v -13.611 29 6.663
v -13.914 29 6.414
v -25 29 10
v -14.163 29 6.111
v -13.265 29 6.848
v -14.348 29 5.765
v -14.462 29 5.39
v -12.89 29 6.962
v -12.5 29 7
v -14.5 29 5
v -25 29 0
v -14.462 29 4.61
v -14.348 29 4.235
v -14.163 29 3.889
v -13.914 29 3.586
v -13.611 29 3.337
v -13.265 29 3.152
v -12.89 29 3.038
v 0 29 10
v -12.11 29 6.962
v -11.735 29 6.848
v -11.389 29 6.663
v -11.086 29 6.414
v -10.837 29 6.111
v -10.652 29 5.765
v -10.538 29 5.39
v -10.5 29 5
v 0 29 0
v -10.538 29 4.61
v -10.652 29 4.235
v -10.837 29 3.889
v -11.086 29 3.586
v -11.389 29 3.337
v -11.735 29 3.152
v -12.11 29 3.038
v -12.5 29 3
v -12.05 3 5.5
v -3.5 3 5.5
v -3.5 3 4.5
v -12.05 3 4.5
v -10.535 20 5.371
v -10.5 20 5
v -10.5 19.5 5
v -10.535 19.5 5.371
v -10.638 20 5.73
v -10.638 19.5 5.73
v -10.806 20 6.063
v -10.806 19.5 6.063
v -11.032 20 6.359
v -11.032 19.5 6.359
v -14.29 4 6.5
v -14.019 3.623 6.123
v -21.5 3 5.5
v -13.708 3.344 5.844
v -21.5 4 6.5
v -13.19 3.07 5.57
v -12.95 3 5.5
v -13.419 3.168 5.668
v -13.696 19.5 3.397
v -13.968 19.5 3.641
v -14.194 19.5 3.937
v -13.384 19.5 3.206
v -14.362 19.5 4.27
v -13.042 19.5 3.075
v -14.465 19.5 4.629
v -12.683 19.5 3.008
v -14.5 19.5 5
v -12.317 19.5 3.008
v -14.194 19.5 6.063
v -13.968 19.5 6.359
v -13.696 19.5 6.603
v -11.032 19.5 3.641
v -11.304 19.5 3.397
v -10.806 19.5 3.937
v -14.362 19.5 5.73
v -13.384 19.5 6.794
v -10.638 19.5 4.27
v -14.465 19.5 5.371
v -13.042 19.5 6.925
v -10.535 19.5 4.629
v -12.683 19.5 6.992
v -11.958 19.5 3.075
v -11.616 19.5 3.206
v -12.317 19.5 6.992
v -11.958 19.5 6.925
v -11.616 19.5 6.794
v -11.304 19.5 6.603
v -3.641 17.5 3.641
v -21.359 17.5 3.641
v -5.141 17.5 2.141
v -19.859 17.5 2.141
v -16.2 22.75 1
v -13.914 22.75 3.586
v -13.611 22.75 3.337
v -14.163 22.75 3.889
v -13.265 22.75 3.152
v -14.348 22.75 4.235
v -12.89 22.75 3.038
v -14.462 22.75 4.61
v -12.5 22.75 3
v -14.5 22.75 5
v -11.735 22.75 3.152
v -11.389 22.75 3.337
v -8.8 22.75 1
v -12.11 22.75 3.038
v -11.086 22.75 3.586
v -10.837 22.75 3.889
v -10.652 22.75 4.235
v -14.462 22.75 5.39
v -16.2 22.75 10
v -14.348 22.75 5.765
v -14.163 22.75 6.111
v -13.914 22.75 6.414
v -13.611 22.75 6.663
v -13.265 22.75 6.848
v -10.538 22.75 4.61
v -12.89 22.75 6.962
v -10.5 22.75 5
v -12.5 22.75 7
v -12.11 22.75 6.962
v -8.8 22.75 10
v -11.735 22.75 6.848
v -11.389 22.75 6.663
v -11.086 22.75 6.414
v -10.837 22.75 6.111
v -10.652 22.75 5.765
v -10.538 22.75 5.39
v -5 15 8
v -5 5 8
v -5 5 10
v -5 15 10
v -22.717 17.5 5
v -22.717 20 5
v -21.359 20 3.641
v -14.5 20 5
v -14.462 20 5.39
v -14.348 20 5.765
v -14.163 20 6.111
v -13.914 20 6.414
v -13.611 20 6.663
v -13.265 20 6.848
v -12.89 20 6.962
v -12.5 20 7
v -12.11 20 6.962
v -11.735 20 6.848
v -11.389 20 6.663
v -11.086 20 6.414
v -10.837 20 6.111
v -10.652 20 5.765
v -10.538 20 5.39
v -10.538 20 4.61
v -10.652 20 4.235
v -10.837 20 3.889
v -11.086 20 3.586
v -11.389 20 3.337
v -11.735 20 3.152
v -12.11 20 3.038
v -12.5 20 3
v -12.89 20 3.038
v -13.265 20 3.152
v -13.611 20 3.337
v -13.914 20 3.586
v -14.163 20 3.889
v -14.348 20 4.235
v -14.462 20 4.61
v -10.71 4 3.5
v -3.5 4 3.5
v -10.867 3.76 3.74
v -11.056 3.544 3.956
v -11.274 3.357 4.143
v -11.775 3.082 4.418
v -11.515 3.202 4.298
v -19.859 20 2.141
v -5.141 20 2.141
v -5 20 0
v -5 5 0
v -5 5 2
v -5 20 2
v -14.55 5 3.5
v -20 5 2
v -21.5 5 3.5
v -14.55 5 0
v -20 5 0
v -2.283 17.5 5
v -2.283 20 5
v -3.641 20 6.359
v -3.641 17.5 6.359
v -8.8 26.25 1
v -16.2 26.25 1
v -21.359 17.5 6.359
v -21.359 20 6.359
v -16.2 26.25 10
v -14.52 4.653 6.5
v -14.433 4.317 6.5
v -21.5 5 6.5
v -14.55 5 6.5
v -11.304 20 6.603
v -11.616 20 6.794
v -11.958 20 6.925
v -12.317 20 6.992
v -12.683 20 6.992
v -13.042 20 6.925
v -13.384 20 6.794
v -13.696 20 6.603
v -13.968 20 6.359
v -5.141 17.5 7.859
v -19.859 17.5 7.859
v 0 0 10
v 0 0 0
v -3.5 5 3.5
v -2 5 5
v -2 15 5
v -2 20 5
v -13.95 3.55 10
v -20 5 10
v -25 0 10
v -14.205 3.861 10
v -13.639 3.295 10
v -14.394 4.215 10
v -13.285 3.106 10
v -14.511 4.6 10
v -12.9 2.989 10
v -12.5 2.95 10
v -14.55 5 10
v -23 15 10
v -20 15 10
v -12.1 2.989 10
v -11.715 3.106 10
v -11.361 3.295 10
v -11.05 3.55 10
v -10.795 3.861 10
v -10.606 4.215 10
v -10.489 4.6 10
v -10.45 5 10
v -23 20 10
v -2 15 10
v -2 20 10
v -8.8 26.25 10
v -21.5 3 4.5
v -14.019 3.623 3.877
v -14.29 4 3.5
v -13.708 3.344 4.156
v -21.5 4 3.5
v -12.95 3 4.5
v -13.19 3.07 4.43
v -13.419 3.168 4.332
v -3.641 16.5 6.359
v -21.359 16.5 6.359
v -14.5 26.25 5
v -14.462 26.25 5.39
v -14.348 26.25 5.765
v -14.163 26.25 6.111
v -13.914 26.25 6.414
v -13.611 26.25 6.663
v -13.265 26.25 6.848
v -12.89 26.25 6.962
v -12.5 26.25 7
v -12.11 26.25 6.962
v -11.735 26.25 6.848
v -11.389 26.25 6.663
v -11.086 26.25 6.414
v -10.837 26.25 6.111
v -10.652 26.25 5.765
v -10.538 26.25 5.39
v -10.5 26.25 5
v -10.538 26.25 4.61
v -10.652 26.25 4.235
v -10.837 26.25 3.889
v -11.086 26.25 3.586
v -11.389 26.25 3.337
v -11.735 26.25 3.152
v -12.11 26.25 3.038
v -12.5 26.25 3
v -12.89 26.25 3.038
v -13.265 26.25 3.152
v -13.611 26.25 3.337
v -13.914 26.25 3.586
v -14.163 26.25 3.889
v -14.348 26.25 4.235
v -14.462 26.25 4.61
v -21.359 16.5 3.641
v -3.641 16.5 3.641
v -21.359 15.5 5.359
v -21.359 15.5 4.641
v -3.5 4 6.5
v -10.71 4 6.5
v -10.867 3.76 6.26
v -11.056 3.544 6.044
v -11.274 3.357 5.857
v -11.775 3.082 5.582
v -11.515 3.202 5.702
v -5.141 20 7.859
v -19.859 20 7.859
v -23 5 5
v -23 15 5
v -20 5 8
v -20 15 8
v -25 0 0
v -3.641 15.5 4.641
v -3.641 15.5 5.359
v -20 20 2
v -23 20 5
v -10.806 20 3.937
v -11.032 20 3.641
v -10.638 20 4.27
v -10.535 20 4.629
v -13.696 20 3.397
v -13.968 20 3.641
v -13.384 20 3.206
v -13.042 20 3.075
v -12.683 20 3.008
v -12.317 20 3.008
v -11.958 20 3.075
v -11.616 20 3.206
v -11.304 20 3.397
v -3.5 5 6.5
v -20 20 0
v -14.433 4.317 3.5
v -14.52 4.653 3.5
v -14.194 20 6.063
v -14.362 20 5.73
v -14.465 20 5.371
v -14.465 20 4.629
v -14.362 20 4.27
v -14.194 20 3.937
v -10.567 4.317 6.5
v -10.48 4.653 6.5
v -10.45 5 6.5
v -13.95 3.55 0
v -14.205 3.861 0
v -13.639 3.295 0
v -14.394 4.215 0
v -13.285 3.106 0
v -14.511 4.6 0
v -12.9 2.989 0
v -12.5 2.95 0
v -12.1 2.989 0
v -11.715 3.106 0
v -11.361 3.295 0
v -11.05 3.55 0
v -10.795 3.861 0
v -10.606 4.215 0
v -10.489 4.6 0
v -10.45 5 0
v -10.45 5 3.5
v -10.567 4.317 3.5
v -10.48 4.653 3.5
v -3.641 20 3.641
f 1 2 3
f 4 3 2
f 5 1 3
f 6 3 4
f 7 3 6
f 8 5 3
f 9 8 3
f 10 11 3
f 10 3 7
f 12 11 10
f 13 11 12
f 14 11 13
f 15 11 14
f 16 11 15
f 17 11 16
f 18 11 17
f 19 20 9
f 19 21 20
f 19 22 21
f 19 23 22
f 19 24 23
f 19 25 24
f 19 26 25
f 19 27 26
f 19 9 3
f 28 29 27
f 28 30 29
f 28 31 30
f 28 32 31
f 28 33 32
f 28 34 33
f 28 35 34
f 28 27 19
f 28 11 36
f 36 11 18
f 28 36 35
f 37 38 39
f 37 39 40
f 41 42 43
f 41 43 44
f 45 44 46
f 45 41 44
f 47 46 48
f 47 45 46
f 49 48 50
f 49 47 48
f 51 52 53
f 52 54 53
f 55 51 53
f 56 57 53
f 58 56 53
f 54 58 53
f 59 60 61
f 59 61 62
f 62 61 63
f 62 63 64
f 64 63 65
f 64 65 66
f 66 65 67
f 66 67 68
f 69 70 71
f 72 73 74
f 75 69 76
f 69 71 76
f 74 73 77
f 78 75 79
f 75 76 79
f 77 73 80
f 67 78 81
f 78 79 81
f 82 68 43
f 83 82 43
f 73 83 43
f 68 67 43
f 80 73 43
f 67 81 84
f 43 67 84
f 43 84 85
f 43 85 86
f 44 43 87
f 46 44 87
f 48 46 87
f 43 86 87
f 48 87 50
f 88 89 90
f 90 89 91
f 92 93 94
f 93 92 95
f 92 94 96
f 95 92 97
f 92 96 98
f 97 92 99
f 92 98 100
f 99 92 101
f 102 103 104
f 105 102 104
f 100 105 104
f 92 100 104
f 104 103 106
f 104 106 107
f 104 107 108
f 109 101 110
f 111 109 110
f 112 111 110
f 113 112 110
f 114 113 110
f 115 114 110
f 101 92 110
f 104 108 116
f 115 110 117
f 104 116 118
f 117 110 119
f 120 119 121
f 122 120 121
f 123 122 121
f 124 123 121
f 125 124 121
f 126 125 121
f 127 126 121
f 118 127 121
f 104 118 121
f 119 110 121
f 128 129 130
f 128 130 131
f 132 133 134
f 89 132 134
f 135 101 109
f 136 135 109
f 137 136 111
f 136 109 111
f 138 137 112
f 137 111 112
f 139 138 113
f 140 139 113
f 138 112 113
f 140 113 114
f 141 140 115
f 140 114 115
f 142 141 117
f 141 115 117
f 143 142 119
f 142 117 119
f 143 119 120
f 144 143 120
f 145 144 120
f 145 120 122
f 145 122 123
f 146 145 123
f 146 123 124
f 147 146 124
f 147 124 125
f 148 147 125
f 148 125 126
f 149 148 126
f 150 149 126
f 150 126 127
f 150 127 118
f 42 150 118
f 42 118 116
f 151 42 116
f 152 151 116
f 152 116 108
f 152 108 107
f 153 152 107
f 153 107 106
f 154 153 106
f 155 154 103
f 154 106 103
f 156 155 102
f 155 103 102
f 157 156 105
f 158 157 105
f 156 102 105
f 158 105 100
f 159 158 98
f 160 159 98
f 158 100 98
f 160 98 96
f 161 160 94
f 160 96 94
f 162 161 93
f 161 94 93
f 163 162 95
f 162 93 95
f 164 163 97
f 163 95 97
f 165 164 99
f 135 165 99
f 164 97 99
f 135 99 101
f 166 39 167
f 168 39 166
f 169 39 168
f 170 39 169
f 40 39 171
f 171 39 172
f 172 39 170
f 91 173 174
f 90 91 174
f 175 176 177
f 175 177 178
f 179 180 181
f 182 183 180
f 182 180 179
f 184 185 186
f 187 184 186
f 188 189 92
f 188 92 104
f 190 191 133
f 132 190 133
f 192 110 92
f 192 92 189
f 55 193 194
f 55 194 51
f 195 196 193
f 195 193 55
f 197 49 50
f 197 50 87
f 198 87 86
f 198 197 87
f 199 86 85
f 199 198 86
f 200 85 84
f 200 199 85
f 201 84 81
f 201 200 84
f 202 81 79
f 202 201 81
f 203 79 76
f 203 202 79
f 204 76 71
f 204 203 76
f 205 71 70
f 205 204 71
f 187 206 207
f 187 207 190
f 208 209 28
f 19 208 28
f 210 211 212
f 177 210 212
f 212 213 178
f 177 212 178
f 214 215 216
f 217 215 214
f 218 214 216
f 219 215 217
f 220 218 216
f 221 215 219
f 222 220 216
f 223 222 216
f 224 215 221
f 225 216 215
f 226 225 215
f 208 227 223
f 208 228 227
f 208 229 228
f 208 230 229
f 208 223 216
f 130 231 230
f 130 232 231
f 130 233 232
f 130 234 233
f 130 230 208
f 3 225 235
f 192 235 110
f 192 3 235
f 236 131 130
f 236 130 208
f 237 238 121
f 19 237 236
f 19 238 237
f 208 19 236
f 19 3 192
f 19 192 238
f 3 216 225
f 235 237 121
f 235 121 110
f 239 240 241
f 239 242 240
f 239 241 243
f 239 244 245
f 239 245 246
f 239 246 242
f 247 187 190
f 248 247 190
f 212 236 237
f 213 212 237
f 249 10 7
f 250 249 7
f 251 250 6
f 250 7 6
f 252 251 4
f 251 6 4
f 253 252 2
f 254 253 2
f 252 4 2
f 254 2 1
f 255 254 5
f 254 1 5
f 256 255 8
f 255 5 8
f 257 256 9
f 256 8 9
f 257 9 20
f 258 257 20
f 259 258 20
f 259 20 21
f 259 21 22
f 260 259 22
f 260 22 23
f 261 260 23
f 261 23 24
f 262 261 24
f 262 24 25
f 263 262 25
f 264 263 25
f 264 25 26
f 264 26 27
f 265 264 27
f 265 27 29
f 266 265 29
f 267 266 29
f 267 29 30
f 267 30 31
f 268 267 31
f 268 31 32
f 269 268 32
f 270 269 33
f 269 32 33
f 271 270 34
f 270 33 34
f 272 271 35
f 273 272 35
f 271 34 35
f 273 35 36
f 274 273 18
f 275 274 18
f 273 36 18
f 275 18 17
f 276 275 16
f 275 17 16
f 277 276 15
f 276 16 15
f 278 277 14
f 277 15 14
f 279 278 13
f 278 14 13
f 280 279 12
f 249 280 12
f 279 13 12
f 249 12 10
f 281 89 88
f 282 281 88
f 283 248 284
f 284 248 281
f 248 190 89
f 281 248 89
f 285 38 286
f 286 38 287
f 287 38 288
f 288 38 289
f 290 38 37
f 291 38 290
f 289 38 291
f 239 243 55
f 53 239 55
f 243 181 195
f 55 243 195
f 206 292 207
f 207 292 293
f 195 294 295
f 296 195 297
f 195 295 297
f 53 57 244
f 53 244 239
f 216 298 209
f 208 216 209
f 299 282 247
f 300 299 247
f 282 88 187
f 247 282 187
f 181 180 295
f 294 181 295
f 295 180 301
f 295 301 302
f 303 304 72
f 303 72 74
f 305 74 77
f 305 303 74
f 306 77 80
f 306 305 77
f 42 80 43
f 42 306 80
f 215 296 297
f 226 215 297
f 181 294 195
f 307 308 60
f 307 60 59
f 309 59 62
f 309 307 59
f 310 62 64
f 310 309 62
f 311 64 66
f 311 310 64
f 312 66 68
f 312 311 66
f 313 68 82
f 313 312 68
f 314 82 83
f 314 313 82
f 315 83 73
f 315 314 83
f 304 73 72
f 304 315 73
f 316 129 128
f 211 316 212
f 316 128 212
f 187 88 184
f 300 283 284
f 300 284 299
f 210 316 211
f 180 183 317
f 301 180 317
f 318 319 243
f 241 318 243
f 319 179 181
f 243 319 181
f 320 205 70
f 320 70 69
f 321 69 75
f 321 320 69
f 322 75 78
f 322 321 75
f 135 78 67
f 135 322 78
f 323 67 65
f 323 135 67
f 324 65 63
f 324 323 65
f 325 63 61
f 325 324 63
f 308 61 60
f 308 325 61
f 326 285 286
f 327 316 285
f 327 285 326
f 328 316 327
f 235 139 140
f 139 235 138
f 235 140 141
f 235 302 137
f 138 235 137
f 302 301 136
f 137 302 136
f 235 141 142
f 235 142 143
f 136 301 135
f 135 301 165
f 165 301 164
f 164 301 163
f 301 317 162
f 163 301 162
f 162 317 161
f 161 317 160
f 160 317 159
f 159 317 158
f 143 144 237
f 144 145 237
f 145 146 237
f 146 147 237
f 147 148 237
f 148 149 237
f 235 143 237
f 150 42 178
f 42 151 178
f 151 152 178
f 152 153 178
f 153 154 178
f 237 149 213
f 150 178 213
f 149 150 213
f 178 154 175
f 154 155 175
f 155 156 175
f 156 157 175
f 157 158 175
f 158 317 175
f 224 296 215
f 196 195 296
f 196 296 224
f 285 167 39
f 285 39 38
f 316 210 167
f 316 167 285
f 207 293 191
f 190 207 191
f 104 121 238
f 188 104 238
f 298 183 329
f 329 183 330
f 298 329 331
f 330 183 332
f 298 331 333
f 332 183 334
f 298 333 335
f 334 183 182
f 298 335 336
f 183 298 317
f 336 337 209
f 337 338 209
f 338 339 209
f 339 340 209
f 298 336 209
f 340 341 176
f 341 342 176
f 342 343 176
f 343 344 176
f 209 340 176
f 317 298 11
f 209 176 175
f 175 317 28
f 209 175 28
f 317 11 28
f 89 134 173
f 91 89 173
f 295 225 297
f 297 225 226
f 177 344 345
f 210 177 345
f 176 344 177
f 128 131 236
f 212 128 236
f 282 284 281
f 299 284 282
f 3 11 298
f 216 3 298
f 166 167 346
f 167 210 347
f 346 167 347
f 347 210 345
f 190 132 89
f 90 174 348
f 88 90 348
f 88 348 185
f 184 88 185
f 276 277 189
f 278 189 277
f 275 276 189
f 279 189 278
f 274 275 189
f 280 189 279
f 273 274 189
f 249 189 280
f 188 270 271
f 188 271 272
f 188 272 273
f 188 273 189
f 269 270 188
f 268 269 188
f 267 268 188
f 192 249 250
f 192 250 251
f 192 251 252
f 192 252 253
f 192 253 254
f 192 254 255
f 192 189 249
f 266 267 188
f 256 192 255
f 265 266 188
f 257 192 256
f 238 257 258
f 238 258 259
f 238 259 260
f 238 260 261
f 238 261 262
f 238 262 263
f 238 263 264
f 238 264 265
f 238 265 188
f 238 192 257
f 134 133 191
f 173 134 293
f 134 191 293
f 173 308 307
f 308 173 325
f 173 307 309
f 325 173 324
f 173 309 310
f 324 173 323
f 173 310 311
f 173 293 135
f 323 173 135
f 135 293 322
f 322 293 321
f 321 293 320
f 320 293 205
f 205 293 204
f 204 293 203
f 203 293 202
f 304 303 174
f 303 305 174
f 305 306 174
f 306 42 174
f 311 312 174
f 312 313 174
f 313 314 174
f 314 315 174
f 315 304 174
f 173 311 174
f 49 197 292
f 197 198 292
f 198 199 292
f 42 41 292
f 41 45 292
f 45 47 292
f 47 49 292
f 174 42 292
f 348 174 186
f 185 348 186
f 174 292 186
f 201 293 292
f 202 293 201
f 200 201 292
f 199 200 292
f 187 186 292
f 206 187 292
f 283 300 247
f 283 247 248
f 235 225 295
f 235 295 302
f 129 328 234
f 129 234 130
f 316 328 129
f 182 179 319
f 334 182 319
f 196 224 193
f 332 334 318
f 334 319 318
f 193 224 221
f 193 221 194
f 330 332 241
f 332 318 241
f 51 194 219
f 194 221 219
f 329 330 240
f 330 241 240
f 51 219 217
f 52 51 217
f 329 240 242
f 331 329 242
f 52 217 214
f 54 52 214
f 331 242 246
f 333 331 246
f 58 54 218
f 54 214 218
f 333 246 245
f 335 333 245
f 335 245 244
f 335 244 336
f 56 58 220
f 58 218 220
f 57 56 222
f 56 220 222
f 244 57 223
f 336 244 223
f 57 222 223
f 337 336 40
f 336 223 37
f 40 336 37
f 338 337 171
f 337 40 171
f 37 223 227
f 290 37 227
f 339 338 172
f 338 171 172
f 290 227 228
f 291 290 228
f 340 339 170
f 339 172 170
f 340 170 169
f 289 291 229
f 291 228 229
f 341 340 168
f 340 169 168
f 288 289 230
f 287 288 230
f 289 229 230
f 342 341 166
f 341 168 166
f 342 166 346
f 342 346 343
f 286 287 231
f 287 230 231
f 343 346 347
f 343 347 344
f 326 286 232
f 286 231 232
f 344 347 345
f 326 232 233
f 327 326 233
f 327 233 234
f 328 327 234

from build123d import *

# Parameters (mm, degrees)
F0_W          = 25
F0_H          = 25
F0_W_2        = 15
F0_H_2        = 15
F0_H_3        = 4
F1_DEPTH      = 10
F2_W          = 3
F2_H          = 5
F3_DEPTH      = 5
F5_DEPTH      = 10
F5_DEPTH_BACK = 5
F6_W          = 18
F6_H          = 3
F7_DEPTH      = 2
F8_SIZE       = 1
F10_DEPTH     = 25
F11_R         = 2
F12_DEPTH     = 9
F13_W         = 7.4
F13_H         = 3.5
F14_DEPTH     = 9
F16_DEPTH     = 2.5
F17_DEPTH     = 4.5
F18_SIZE      = 1
F19_DEPTH     = 0.5


with BuildPart() as f1:
    # F0 (on Top) → F1 (new body)
    with BuildSketch(Plane.XY):
        with Locations((-12.5, 12.5)):
            Rectangle(F0_W, F0_H)
        with Locations((-12.5, 12.5)):
            Rectangle(F0_W_2, F0_H_2, mode=Mode.SUBTRACT)
        with Locations((-12.5, 27)):
            Rectangle(F0_W, F0_H_3)
    extrude(amount=F1_DEPTH)

    # F2 (on face) → F3 (cut)
    with BuildSketch(Plane.XY.offset(10)):
        with Locations((-21.5, 17.5)):
            Rectangle(F2_W, F2_H)
        with Locations((-3.5, 17.5)):
            Rectangle(F2_W, F2_H)
    extrude(amount=-F3_DEPTH, mode=Mode.SUBTRACT)

    # F4 (on face) → F5 (cut, two sides)
    with BuildSketch(Plane(origin=(0, 15, 0), x_dir=(-1, 0, 0), z_dir=(0, 1, 0))) as f5_sk:
        Polygon((20, 2), (23, 5), (20, 5), align=None)
        Polygon((20, 5), (23, 5), (20, 8), align=None)
        Polygon((5, 5), (2, 5), (5, 2), align=None)
        Polygon((5, 8), (2, 5), (5, 5), align=None)
    extrude(amount=-F5_DEPTH, mode=Mode.SUBTRACT)
    extrude(f5_sk.sketch, amount=F5_DEPTH_BACK, mode=Mode.SUBTRACT)

    # F6 (on face) → F7 (cut)
    with BuildSketch(Plane(origin=(0, 5, 0), x_dir=(-1, 0, 0), z_dir=(0, 1, 0))):
        with Locations((12.5, 5)):
            Rectangle(F6_W, F6_H)
    extrude(amount=-F7_DEPTH, mode=Mode.SUBTRACT)

    # F8
    f8_edges = [f1.edges().sort_by_distance(p)[0] for p in [
        (-12.5, 3, 3.5),
        (-12.5, 3, 6.5),
    ]]
    chamfer(f8_edges, length=F8_SIZE)

    # F9 (on face) → F10 (cut)
    with BuildSketch(Plane.XY.offset(10)):
        with BuildLine():
            ThreePointArc((-14.55, 5), (-12.5, 2.95), (-10.45, 5))
            Line((-10.45, 5), (-14.55, 5))
        make_face()
    extrude(amount=-F10_DEPTH, mode=Mode.SUBTRACT)

    # F11 (on face) → F12 (cut, through all)
    with BuildSketch(Plane(origin=(0, 29, 0), x_dir=(-1, 0, 0), z_dir=(0, 1, 0))):
        with Locations((12.5, 5)):
            Circle(F11_R)
    extrude(amount=-F12_DEPTH, mode=Mode.SUBTRACT)

    # F13 (on face) → F14 (cut, through all)
    with BuildSketch(Plane.XY.offset(10)):
        with Locations((-12.5, 24.5)):
            Rectangle(F13_W, F13_H)
    extrude(amount=-F14_DEPTH, mode=Mode.SUBTRACT)


with BuildPart() as f16:
    # F15 (on face) → F16 (new body)
    with BuildSketch(Plane.XZ.offset(-20)):
        with BuildLine():
            Line((-19.8585786438, 7.8585786438), (-21.3585786438, 6.3585786438))
            Line((-21.3585786438, 6.3585786438), (-13.967741145, 6.3585786438))
            ThreePointArc((-13.967741145, 6.3585786438), (-12.5, 7), (-11.032258855, 6.3585786438))
            Line((-11.032258855, 6.3585786438), (-3.6414213562, 6.3585786438))
            Line((-3.6414213562, 6.3585786438), (-5.1414213562, 7.8585786438))
            Line((-5.1414213562, 7.8585786438), (-19.8585786438, 7.8585786438))
        make_face()
        Polygon((-22.7171572875, 5), (-21.3585786438, 3.6414213562), (-21.3585786438, 6.3585786438), align=None)
        with BuildLine():
            Line((-21.3585786438, 6.3585786438), (-21.3585786438, 3.6414213562))
            Line((-21.3585786438, 3.6414213562), (-13.967741145, 3.6414213562))
            ThreePointArc((-13.967741145, 3.6414213562), (-14.5, 5), (-13.967741145, 6.3585786438))
            Line((-13.967741145, 6.3585786438), (-21.3585786438, 6.3585786438))
        make_face()
        with BuildLine():
            Line((-11.032258855, 3.6414213562), (-3.6414213562, 3.6414213562))
            Line((-3.6414213562, 3.6414213562), (-3.6414213562, 6.3585786438))
            Line((-3.6414213562, 6.3585786438), (-11.032258855, 6.3585786438))
            ThreePointArc((-11.032258855, 6.3585786438), (-10.6378128061, 5.7295607274), (-10.5, 5))
            ThreePointArc((-10.5, 5), (-10.6378128061, 4.2704392726), (-11.032258855, 3.6414213562))
        make_face()
        with BuildLine():
            Line((-21.3585786438, 3.6414213562), (-19.8585786438, 2.1414213562))
            Line((-19.8585786438, 2.1414213562), (-5.1414213562, 2.1414213562))
            Line((-5.1414213562, 2.1414213562), (-3.6414213562, 3.6414213562))
            Line((-3.6414213562, 3.6414213562), (-11.032258855, 3.6414213562))
            ThreePointArc((-11.032258855, 3.6414213562), (-12.5, 3), (-13.967741145, 3.6414213562))
            Line((-13.967741145, 3.6414213562), (-21.3585786438, 3.6414213562))
        make_face()
        Polygon((-3.6414213562, 6.3585786438), (-3.6414213562, 3.6414213562), (-2.2828427125, 5), align=None)
        with BuildLine():
            ThreePointArc((-13.967741145, 6.3585786438), (-14.5, 5), (-13.967741145, 3.6414213562))
            Line((-13.967741145, 3.6414213562), (-11.032258855, 3.6414213562))
            ThreePointArc((-11.032258855, 3.6414213562), (-10.6378128061, 4.2704392726), (-10.5, 5))
            ThreePointArc((-10.5, 5), (-10.6378128061, 5.7295607274), (-11.032258855, 6.3585786438))
            Line((-11.032258855, 6.3585786438), (-13.967741145, 6.3585786438))
        make_face()
        with BuildLine():
            Line((-11.032258855, 3.6414213562), (-13.967741145, 3.6414213562))
            ThreePointArc((-13.967741145, 3.6414213562), (-12.5, 3), (-11.032258855, 3.6414213562))
        make_face()
        with BuildLine():
            ThreePointArc((-11.032258855, 6.3585786438), (-12.5, 7), (-13.967741145, 6.3585786438))
            Line((-13.967741145, 6.3585786438), (-11.032258855, 6.3585786438))
        make_face()
    extrude(amount=F16_DEPTH)

    # F15 (on face) → F17 (join, through all)
    with BuildSketch(Plane.XZ.offset(-20)):
        with BuildLine():
            Line((-21.3585786438, 6.3585786438), (-21.3585786438, 3.6414213562))
            Line((-21.3585786438, 3.6414213562), (-13.967741145, 3.6414213562))
            ThreePointArc((-13.967741145, 3.6414213562), (-14.5, 5), (-13.967741145, 6.3585786438))
            Line((-13.967741145, 6.3585786438), (-21.3585786438, 6.3585786438))
        make_face()
        with BuildLine():
            Line((-11.032258855, 3.6414213562), (-3.6414213562, 3.6414213562))
            Line((-3.6414213562, 3.6414213562), (-3.6414213562, 6.3585786438))
            Line((-3.6414213562, 6.3585786438), (-11.032258855, 6.3585786438))
            ThreePointArc((-11.032258855, 6.3585786438), (-10.6378128061, 5.7295607274), (-10.5, 5))
            ThreePointArc((-10.5, 5), (-10.6378128061, 4.2704392726), (-11.032258855, 3.6414213562))
        make_face()
        with BuildLine():
            ThreePointArc((-13.967741145, 6.3585786438), (-14.5, 5), (-13.967741145, 3.6414213562))
            Line((-13.967741145, 3.6414213562), (-11.032258855, 3.6414213562))
            ThreePointArc((-11.032258855, 3.6414213562), (-10.6378128061, 4.2704392726), (-10.5, 5))
            ThreePointArc((-10.5, 5), (-10.6378128061, 5.7295607274), (-11.032258855, 6.3585786438))
            Line((-11.032258855, 6.3585786438), (-13.967741145, 6.3585786438))
        make_face()
    extrude(amount=F17_DEPTH)

    # F18
    f18_edges = [f16.edges().sort_by_distance(p)[0] for p in [
        (-12.5, 15.5, 3.641421),
        (-12.5, 15.5, 6.358579),
    ]]
    chamfer(f18_edges, length=F18_SIZE)

    # F15 (on face) → F19 (cut)
    with BuildSketch(Plane.XZ.offset(-20)):
        with BuildLine():
            ThreePointArc((-13.967741145, 6.3585786438), (-14.5, 5), (-13.967741145, 3.6414213562))
            Line((-13.967741145, 3.6414213562), (-11.032258855, 3.6414213562))
            ThreePointArc((-11.032258855, 3.6414213562), (-10.6378128061, 4.2704392726), (-10.5, 5))
            ThreePointArc((-10.5, 5), (-10.6378128061, 5.7295607274), (-11.032258855, 6.3585786438))
            Line((-11.032258855, 6.3585786438), (-13.967741145, 6.3585786438))
        make_face()
        with BuildLine():
            Line((-11.032258855, 3.6414213562), (-13.967741145, 3.6414213562))
            ThreePointArc((-13.967741145, 3.6414213562), (-12.5, 3), (-11.032258855, 3.6414213562))
        make_face()
        with BuildLine():
            ThreePointArc((-11.032258855, 6.3585786438), (-12.5, 7), (-13.967741145, 6.3585786438))
            Line((-13.967741145, 6.3585786438), (-11.032258855, 6.3585786438))
        make_face()
    extrude(amount=F19_DEPTH, mode=Mode.SUBTRACT)


solid = Compound([f1.part, f16.part])
